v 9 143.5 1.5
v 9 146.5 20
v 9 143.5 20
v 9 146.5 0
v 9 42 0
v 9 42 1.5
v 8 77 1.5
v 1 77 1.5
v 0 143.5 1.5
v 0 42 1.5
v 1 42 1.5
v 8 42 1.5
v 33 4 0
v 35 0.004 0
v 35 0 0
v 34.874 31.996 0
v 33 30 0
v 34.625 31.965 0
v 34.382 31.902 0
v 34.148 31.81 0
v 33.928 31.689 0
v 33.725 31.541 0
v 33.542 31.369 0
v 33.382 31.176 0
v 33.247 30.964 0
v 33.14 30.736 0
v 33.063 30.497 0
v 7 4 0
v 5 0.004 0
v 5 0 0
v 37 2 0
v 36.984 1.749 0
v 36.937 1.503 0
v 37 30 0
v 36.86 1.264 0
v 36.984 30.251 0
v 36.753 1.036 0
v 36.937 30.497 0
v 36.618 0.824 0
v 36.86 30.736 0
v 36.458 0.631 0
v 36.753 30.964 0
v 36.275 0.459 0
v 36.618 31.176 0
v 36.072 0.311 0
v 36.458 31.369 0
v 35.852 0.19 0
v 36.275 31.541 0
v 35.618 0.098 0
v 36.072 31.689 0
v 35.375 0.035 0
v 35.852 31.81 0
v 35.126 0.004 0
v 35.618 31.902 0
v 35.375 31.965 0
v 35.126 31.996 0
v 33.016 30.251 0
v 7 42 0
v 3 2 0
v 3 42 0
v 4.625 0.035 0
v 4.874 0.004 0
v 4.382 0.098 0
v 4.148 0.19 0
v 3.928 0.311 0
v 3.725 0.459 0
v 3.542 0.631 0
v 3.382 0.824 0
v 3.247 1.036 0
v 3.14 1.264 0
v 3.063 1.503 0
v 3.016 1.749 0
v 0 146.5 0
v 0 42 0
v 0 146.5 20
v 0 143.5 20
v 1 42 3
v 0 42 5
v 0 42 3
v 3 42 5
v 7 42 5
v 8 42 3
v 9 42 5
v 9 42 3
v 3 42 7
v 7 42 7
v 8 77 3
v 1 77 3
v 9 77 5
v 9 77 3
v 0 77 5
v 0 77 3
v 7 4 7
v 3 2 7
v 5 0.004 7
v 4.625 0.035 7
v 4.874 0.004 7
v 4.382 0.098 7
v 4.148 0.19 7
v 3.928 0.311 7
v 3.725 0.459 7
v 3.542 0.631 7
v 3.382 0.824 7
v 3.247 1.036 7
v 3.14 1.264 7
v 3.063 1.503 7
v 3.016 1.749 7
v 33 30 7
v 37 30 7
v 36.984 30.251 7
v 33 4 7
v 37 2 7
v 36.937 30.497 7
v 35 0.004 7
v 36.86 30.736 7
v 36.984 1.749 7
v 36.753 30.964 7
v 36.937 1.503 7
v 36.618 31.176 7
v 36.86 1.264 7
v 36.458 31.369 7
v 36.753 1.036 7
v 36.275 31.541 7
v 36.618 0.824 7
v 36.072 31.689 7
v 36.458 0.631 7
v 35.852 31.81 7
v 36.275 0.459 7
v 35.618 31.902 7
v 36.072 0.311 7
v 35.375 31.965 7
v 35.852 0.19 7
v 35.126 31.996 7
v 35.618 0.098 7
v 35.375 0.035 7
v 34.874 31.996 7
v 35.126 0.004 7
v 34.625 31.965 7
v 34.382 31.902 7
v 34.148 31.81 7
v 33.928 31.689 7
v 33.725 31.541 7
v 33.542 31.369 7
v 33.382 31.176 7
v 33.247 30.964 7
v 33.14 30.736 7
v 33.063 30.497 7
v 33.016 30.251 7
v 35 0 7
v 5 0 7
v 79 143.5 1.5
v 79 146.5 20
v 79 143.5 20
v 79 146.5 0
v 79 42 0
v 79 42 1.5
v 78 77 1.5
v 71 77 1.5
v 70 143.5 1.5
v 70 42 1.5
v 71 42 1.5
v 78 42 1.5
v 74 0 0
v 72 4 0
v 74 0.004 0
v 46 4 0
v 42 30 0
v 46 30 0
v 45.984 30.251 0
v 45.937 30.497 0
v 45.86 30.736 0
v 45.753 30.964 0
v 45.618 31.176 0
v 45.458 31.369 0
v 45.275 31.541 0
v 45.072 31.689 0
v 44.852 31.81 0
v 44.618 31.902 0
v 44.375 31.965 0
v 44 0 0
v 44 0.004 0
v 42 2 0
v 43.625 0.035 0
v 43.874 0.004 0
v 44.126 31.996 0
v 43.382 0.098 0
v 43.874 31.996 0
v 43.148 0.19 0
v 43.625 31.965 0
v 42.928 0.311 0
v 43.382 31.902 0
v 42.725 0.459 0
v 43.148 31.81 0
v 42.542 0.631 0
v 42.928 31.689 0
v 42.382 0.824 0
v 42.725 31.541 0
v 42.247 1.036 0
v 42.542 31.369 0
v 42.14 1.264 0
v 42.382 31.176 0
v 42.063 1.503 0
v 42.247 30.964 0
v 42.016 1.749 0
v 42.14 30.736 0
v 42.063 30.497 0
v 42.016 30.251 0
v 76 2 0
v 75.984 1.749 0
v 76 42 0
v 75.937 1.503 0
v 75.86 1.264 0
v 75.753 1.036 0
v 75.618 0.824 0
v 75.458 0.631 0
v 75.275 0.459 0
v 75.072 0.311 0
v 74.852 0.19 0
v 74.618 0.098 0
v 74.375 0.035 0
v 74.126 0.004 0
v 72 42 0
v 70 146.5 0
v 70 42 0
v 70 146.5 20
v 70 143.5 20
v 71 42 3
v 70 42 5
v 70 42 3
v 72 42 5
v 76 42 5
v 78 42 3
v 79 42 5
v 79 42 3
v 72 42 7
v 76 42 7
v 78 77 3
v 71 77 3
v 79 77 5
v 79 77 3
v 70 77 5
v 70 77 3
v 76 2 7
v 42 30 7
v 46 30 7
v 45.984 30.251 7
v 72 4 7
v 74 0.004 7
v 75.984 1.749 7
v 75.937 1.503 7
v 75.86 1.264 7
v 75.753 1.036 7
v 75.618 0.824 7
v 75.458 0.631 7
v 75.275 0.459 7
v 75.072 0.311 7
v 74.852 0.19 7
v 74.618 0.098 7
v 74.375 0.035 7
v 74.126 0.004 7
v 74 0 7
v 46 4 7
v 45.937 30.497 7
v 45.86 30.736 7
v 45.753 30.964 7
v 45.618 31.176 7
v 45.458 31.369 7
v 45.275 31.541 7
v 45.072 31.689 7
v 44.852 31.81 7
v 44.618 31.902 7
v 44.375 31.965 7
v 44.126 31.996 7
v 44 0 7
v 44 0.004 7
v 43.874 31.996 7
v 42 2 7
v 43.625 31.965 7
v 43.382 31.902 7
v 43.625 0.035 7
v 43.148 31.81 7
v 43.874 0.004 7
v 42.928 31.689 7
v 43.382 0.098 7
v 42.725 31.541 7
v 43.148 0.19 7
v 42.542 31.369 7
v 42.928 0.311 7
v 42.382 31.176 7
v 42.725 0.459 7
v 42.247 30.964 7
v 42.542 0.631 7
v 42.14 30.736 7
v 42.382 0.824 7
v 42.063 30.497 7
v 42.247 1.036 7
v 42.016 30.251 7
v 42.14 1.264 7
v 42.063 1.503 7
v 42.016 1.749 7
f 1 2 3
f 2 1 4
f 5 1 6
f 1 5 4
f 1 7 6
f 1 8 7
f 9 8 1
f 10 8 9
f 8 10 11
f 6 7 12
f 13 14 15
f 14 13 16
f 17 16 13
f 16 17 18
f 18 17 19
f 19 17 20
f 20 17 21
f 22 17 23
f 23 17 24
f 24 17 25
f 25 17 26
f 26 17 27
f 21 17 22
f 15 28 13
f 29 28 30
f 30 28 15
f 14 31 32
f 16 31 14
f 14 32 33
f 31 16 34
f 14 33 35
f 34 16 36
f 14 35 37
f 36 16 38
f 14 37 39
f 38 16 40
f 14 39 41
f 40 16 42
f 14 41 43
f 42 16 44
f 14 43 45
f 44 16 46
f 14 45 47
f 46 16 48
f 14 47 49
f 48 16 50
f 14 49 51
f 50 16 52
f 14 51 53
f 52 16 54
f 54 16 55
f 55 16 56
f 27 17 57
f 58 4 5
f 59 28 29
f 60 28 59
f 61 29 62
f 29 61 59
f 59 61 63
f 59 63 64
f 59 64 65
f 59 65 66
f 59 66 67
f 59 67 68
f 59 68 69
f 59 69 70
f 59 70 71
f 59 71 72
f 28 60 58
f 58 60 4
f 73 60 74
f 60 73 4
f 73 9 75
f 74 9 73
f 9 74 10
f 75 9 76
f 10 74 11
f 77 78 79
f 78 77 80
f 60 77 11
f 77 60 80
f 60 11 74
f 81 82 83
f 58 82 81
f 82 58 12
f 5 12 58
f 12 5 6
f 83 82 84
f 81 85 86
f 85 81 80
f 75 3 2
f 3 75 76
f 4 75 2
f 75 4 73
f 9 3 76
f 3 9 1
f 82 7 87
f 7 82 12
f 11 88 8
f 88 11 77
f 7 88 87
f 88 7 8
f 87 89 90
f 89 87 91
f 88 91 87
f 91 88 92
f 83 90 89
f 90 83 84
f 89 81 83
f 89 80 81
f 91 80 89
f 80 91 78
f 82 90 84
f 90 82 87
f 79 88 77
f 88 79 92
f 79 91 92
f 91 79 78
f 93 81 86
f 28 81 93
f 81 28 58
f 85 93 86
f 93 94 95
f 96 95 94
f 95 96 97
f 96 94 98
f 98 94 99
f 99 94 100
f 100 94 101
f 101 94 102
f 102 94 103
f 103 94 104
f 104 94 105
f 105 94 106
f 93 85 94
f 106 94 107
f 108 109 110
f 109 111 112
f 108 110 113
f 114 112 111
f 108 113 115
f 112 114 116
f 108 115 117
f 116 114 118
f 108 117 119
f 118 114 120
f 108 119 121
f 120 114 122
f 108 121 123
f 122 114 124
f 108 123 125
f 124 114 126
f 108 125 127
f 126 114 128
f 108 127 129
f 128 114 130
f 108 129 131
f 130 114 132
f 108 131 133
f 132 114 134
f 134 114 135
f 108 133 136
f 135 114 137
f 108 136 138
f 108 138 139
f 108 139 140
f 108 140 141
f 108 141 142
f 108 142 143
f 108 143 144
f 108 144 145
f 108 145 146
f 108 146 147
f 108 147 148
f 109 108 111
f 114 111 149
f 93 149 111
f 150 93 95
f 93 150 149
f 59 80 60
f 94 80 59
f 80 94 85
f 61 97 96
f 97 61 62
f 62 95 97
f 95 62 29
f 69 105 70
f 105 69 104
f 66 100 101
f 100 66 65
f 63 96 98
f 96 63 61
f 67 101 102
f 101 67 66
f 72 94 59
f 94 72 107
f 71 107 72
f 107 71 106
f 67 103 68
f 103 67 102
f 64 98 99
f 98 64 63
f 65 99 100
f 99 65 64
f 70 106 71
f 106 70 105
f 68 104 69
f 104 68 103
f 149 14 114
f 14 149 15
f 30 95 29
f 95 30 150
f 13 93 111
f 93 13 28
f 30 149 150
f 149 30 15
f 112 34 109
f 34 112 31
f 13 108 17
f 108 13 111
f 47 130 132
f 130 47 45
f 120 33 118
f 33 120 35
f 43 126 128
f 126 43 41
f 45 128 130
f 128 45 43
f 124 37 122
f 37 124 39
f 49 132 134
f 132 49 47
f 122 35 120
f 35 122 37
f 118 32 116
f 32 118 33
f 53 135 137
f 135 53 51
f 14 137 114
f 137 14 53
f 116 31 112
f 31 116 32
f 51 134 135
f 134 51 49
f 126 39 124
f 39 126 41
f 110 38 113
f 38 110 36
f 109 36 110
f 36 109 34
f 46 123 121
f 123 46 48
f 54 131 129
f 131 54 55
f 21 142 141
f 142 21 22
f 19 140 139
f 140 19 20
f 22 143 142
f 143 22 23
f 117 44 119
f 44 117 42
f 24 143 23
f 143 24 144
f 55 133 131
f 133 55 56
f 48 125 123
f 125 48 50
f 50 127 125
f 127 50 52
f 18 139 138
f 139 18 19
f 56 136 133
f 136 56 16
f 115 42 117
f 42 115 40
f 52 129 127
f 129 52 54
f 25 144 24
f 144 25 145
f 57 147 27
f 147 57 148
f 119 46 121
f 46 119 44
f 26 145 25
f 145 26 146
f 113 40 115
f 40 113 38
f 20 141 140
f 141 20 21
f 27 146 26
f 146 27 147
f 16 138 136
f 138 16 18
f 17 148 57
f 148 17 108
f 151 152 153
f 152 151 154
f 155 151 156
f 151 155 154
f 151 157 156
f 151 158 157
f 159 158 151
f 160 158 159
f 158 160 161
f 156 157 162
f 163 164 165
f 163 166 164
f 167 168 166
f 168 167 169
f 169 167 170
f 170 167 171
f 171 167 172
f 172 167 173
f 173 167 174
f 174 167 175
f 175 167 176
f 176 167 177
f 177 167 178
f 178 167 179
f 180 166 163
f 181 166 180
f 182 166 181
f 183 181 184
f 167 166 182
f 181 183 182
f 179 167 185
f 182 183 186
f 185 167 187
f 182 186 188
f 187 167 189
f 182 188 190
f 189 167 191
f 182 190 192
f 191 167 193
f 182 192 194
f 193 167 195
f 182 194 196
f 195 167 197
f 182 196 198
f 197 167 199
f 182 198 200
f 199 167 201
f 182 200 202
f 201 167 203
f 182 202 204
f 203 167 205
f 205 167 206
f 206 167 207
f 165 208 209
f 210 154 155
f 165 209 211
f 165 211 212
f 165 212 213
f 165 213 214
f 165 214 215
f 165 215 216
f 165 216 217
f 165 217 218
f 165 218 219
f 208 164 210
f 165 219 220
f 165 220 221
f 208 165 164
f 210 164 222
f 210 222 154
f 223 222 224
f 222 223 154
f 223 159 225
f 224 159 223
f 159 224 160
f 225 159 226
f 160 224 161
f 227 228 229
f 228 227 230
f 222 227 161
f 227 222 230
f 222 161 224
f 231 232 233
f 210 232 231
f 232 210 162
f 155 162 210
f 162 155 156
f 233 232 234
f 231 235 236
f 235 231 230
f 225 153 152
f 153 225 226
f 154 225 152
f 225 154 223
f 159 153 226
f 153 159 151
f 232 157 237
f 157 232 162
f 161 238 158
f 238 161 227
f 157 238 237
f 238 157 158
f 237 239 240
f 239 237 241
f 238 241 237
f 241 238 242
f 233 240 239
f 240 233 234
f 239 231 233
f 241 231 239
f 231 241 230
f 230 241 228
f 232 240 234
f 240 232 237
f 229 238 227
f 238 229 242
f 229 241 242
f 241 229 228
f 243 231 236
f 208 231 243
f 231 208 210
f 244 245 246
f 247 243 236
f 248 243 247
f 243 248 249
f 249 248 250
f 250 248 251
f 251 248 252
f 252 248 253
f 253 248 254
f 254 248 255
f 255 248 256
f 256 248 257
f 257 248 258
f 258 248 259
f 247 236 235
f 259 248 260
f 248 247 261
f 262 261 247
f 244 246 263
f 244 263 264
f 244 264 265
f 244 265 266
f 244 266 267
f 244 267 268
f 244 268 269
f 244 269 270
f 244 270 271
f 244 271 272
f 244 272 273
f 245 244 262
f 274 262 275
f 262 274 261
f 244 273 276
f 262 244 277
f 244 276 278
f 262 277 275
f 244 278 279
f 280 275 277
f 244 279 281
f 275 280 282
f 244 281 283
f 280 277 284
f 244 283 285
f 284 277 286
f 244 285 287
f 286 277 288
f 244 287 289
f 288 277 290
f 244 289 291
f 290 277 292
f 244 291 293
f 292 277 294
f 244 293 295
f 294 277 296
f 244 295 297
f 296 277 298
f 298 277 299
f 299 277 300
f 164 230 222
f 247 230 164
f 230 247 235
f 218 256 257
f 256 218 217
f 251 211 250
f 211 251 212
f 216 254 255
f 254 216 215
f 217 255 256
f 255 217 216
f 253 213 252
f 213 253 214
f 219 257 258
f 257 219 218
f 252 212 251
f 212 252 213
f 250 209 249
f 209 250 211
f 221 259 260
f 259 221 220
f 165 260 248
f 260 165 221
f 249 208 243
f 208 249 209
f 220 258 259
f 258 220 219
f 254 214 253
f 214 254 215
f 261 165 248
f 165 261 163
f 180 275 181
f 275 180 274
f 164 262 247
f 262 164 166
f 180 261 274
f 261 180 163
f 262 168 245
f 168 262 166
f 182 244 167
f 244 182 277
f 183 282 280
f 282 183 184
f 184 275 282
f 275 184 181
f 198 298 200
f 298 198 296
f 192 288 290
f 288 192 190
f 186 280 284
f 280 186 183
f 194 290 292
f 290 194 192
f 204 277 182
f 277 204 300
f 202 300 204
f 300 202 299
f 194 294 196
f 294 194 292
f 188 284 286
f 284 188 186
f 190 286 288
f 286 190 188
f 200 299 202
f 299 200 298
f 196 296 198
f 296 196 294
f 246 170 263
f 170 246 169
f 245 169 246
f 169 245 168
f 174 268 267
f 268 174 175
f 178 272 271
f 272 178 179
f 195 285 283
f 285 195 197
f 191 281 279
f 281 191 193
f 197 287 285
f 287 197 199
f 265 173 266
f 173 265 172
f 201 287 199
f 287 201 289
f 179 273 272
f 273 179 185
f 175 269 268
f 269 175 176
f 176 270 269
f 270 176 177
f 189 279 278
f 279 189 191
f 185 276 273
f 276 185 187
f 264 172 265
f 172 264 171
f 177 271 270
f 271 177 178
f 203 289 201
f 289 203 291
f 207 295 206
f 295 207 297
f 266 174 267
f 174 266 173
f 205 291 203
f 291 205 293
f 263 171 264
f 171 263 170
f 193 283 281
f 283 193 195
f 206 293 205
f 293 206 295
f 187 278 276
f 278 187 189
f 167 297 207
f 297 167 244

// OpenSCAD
// Nintendo Switch mount for car visor

$fn=50;
width=30;   // [7:1:50]
 
// right side
    union() {
        translate([0,42,0]) cube([9,103,1.5]);
        translate([0,143.5,0]) cube([9,3,20]);
        translate([1,42,1.5]) cube([7,35,3]); 
        translate([0,42,3]) cube([9,35,2]);
        translate([3,2,0]) cube([4,40,7]);
        translate([5,2,0]) cylinder(r=2,h=7);
        translate([5,0,0]) cube([width,4,7]);
        translate([width+3,2,0]) cube([4,28,7]);
        translate([width+5,2,0]) cylinder(r=2,h=7);
        translate([width+5,30,0]) cylinder(r=2,h=7);
    }


// left side
    union() {
        translate([width*2+10,42,0]) cube([9,103,1.5]);
        translate([width*2+10,143.5 ,0]) cube([9,3,20]);
        translate([width*2+11,42,1.5]) cube([7,35,3]); 
        translate([width*2+10,42,3]) cube([9,35,2]);
        translate([width*2+12,2,0]) cube([4,40,7]);
        translate([width*2+14,2,0]) cylinder(r=2,h=7);
        
        translate([width+14,0,0]) cube([width,4,7]);
        translate([width+12,2,0]) cube([4,28,7]);
        translate([width+14,2,0]) cylinder(r=2,h=7);
        translate([width+14,30,0]) cylinder(r=2,h=7);
    }
